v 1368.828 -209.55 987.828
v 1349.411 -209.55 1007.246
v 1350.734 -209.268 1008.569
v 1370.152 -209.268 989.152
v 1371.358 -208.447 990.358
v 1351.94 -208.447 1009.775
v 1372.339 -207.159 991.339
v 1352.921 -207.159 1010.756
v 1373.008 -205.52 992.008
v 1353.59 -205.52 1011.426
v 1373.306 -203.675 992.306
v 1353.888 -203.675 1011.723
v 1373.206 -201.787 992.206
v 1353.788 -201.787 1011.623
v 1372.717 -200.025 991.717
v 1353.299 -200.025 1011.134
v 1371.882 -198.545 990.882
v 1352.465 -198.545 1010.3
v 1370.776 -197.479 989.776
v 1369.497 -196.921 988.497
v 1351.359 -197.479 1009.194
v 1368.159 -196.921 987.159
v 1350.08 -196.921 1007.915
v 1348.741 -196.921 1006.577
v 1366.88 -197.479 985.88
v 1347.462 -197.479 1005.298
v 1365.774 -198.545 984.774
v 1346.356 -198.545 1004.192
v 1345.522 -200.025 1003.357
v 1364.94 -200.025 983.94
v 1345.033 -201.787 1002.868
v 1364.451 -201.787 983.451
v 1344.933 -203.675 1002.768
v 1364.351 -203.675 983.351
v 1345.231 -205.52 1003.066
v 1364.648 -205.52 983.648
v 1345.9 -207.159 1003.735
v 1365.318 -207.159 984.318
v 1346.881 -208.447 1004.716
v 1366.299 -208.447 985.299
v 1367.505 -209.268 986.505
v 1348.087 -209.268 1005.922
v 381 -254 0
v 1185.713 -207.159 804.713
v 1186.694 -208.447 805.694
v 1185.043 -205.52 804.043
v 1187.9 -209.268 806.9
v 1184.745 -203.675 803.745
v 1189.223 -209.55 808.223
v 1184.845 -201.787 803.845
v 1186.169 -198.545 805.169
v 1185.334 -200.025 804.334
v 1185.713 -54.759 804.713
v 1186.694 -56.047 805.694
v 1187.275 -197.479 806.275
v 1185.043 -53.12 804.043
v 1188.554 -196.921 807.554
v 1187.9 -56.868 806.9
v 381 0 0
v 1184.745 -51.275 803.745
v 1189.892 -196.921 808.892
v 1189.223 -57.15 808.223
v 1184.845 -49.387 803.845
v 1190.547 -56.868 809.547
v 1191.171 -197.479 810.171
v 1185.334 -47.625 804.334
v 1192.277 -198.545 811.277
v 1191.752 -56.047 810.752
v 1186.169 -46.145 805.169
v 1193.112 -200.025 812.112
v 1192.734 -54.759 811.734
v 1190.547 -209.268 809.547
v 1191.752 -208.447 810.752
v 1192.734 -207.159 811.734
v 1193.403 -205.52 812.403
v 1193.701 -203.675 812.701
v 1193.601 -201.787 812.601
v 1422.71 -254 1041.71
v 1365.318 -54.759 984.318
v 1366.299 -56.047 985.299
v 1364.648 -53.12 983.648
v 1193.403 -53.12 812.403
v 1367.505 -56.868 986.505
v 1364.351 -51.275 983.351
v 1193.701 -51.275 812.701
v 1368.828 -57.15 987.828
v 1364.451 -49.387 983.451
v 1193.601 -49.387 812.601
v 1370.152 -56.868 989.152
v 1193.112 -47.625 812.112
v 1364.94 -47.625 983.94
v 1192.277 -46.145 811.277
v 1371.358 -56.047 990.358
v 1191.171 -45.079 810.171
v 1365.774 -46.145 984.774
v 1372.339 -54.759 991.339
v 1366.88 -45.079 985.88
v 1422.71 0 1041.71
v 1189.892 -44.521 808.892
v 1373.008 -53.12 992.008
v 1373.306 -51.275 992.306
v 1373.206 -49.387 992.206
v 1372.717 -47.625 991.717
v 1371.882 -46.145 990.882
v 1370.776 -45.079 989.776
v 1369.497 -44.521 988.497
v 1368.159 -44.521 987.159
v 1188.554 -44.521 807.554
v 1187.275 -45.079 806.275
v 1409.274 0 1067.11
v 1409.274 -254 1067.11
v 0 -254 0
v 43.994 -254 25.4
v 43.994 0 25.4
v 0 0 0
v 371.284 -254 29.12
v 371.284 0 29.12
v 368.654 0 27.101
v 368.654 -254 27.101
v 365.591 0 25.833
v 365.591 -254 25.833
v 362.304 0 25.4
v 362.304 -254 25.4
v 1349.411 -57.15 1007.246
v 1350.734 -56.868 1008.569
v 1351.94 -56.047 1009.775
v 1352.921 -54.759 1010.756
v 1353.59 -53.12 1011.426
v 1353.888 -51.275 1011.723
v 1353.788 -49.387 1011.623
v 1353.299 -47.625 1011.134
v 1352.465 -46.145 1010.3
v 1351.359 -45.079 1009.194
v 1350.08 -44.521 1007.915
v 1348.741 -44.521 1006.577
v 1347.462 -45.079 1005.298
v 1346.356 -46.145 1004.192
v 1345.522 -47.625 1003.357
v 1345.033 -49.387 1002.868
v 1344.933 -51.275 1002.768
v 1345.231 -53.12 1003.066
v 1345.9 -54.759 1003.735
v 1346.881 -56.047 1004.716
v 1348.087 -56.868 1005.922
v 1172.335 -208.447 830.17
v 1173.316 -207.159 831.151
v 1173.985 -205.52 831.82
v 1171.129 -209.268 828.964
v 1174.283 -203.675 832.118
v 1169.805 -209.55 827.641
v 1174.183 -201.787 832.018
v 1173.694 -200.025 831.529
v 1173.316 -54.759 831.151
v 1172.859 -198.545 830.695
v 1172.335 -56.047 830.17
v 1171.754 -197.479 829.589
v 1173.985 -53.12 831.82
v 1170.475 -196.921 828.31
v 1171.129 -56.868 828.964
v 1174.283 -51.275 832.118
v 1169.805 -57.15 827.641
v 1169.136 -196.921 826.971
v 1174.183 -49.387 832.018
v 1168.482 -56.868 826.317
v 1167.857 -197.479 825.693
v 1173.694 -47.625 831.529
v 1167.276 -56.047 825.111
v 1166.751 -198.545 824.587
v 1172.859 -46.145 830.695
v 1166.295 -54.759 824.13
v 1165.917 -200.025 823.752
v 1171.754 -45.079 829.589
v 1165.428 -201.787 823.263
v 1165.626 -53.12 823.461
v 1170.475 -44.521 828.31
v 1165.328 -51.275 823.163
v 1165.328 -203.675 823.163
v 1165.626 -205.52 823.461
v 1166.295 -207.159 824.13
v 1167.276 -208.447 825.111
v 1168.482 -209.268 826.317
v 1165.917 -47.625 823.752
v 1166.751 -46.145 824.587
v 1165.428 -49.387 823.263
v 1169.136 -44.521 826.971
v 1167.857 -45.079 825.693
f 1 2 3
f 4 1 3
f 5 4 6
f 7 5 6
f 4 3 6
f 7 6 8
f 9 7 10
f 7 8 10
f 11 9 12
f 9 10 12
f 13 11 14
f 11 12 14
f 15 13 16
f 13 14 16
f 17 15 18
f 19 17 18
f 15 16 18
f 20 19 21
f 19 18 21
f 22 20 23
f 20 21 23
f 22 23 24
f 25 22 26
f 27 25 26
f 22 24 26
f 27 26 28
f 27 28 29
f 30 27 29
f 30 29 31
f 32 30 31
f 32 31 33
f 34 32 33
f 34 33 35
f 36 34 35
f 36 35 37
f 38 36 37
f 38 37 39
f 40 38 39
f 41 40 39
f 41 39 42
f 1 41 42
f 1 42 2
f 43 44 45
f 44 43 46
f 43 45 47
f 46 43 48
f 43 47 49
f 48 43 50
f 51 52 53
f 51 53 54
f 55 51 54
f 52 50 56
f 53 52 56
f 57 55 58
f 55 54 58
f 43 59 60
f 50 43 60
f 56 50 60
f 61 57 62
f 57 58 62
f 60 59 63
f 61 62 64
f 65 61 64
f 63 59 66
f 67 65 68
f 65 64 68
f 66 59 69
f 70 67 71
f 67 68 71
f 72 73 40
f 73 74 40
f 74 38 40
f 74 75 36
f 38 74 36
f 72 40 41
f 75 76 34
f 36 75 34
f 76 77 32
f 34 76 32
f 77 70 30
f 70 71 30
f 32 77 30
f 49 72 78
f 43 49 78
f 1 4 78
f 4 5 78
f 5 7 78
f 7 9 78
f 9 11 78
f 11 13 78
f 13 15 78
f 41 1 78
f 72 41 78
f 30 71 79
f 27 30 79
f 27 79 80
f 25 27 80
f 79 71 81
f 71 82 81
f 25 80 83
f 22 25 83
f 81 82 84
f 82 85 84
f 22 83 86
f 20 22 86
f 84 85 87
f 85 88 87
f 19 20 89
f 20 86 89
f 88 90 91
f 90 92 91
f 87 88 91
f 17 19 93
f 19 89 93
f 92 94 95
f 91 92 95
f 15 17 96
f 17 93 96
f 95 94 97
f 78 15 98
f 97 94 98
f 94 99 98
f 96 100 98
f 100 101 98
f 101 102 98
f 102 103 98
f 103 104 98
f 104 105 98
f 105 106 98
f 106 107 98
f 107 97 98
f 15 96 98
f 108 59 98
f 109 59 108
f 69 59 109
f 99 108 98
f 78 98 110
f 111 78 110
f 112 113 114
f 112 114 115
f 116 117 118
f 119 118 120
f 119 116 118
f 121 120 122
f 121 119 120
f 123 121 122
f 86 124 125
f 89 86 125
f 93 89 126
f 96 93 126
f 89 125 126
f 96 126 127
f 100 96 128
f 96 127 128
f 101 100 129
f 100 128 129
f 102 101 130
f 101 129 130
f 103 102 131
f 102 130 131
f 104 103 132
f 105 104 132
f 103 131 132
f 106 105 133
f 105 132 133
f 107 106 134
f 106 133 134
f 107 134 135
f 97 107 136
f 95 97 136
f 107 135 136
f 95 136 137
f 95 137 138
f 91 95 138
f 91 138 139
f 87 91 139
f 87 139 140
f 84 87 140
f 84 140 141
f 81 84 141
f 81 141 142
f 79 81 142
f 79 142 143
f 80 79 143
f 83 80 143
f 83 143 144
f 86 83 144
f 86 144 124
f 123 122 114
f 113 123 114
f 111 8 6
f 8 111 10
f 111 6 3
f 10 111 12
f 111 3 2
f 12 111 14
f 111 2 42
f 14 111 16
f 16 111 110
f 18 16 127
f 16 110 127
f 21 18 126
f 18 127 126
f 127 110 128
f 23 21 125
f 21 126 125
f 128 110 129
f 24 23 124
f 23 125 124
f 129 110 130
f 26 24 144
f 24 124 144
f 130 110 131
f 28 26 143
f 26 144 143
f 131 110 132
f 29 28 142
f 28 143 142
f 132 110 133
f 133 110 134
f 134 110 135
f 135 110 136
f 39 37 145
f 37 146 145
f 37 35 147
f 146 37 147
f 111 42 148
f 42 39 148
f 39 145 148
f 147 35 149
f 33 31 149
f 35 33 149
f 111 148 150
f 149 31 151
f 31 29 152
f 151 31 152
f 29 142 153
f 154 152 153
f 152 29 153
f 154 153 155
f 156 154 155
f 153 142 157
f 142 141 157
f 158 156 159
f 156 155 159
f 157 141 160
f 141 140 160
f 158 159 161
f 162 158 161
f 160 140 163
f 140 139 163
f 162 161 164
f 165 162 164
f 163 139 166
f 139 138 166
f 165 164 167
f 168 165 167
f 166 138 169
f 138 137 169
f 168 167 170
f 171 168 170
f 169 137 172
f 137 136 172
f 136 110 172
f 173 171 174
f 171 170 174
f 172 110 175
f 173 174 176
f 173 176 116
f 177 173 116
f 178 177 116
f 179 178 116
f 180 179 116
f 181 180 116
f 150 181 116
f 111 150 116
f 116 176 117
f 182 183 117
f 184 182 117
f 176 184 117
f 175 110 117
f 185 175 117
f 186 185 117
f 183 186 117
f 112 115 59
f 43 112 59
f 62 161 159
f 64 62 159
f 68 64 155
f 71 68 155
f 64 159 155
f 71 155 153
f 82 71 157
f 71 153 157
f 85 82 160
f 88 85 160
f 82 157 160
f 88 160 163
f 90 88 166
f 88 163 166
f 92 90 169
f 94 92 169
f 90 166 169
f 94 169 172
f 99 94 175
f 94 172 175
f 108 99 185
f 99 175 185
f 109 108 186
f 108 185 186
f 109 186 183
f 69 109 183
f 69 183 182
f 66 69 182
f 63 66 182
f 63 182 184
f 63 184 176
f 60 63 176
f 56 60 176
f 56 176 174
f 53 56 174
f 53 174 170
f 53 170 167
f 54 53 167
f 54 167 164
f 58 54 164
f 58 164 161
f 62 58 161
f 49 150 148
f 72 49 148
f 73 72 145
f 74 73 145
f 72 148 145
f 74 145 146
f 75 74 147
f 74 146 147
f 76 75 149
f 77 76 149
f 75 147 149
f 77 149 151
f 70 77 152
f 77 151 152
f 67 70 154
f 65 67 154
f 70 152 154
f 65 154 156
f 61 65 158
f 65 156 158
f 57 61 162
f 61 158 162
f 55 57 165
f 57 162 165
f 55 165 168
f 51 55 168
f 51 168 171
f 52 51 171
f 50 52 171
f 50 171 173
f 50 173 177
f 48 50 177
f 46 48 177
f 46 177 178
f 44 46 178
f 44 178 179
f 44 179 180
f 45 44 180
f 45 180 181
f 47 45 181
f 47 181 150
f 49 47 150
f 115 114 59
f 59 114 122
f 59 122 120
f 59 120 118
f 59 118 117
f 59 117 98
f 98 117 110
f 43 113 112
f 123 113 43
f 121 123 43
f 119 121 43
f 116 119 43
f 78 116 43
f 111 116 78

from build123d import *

# Parameters (mm, degrees)
F1_DEPTH = 254
F2_R     = 12.7
F4_D     = 12.7


with BuildPart() as f1:
    # F0 (on Front) → F1 (new body)
    with BuildSketch(Plane.XZ):
        Polygon((43.994091, 25.4), (0, 0), (381, 0), (1422.70971, 1041.70971), (1409.274401, 1067.10971), (367.564691, 25.4), align=None)
    extrude(amount=F1_DEPTH)

    # F2
    f2_edges = [f1.edges().sort_by_distance(p)[0] for p in [
        (367.564691, -127, 25.4),
    ]]
    fillet(f2_edges, radius=F2_R)

    # F4 (through all)
    with Locations(Plane(origin=(190.5, 0, -190.5), x_dir=(0, 1, 0), z_dir=(0.707107, 0, -0.707107))):
        with Locations((-203.2, 1412.407684), (-203.2, 1666.407684), (-50.8, 1666.407684), (-50.8, 1412.407684)):
            Hole(F4_D / 2)


solid = f1.part
